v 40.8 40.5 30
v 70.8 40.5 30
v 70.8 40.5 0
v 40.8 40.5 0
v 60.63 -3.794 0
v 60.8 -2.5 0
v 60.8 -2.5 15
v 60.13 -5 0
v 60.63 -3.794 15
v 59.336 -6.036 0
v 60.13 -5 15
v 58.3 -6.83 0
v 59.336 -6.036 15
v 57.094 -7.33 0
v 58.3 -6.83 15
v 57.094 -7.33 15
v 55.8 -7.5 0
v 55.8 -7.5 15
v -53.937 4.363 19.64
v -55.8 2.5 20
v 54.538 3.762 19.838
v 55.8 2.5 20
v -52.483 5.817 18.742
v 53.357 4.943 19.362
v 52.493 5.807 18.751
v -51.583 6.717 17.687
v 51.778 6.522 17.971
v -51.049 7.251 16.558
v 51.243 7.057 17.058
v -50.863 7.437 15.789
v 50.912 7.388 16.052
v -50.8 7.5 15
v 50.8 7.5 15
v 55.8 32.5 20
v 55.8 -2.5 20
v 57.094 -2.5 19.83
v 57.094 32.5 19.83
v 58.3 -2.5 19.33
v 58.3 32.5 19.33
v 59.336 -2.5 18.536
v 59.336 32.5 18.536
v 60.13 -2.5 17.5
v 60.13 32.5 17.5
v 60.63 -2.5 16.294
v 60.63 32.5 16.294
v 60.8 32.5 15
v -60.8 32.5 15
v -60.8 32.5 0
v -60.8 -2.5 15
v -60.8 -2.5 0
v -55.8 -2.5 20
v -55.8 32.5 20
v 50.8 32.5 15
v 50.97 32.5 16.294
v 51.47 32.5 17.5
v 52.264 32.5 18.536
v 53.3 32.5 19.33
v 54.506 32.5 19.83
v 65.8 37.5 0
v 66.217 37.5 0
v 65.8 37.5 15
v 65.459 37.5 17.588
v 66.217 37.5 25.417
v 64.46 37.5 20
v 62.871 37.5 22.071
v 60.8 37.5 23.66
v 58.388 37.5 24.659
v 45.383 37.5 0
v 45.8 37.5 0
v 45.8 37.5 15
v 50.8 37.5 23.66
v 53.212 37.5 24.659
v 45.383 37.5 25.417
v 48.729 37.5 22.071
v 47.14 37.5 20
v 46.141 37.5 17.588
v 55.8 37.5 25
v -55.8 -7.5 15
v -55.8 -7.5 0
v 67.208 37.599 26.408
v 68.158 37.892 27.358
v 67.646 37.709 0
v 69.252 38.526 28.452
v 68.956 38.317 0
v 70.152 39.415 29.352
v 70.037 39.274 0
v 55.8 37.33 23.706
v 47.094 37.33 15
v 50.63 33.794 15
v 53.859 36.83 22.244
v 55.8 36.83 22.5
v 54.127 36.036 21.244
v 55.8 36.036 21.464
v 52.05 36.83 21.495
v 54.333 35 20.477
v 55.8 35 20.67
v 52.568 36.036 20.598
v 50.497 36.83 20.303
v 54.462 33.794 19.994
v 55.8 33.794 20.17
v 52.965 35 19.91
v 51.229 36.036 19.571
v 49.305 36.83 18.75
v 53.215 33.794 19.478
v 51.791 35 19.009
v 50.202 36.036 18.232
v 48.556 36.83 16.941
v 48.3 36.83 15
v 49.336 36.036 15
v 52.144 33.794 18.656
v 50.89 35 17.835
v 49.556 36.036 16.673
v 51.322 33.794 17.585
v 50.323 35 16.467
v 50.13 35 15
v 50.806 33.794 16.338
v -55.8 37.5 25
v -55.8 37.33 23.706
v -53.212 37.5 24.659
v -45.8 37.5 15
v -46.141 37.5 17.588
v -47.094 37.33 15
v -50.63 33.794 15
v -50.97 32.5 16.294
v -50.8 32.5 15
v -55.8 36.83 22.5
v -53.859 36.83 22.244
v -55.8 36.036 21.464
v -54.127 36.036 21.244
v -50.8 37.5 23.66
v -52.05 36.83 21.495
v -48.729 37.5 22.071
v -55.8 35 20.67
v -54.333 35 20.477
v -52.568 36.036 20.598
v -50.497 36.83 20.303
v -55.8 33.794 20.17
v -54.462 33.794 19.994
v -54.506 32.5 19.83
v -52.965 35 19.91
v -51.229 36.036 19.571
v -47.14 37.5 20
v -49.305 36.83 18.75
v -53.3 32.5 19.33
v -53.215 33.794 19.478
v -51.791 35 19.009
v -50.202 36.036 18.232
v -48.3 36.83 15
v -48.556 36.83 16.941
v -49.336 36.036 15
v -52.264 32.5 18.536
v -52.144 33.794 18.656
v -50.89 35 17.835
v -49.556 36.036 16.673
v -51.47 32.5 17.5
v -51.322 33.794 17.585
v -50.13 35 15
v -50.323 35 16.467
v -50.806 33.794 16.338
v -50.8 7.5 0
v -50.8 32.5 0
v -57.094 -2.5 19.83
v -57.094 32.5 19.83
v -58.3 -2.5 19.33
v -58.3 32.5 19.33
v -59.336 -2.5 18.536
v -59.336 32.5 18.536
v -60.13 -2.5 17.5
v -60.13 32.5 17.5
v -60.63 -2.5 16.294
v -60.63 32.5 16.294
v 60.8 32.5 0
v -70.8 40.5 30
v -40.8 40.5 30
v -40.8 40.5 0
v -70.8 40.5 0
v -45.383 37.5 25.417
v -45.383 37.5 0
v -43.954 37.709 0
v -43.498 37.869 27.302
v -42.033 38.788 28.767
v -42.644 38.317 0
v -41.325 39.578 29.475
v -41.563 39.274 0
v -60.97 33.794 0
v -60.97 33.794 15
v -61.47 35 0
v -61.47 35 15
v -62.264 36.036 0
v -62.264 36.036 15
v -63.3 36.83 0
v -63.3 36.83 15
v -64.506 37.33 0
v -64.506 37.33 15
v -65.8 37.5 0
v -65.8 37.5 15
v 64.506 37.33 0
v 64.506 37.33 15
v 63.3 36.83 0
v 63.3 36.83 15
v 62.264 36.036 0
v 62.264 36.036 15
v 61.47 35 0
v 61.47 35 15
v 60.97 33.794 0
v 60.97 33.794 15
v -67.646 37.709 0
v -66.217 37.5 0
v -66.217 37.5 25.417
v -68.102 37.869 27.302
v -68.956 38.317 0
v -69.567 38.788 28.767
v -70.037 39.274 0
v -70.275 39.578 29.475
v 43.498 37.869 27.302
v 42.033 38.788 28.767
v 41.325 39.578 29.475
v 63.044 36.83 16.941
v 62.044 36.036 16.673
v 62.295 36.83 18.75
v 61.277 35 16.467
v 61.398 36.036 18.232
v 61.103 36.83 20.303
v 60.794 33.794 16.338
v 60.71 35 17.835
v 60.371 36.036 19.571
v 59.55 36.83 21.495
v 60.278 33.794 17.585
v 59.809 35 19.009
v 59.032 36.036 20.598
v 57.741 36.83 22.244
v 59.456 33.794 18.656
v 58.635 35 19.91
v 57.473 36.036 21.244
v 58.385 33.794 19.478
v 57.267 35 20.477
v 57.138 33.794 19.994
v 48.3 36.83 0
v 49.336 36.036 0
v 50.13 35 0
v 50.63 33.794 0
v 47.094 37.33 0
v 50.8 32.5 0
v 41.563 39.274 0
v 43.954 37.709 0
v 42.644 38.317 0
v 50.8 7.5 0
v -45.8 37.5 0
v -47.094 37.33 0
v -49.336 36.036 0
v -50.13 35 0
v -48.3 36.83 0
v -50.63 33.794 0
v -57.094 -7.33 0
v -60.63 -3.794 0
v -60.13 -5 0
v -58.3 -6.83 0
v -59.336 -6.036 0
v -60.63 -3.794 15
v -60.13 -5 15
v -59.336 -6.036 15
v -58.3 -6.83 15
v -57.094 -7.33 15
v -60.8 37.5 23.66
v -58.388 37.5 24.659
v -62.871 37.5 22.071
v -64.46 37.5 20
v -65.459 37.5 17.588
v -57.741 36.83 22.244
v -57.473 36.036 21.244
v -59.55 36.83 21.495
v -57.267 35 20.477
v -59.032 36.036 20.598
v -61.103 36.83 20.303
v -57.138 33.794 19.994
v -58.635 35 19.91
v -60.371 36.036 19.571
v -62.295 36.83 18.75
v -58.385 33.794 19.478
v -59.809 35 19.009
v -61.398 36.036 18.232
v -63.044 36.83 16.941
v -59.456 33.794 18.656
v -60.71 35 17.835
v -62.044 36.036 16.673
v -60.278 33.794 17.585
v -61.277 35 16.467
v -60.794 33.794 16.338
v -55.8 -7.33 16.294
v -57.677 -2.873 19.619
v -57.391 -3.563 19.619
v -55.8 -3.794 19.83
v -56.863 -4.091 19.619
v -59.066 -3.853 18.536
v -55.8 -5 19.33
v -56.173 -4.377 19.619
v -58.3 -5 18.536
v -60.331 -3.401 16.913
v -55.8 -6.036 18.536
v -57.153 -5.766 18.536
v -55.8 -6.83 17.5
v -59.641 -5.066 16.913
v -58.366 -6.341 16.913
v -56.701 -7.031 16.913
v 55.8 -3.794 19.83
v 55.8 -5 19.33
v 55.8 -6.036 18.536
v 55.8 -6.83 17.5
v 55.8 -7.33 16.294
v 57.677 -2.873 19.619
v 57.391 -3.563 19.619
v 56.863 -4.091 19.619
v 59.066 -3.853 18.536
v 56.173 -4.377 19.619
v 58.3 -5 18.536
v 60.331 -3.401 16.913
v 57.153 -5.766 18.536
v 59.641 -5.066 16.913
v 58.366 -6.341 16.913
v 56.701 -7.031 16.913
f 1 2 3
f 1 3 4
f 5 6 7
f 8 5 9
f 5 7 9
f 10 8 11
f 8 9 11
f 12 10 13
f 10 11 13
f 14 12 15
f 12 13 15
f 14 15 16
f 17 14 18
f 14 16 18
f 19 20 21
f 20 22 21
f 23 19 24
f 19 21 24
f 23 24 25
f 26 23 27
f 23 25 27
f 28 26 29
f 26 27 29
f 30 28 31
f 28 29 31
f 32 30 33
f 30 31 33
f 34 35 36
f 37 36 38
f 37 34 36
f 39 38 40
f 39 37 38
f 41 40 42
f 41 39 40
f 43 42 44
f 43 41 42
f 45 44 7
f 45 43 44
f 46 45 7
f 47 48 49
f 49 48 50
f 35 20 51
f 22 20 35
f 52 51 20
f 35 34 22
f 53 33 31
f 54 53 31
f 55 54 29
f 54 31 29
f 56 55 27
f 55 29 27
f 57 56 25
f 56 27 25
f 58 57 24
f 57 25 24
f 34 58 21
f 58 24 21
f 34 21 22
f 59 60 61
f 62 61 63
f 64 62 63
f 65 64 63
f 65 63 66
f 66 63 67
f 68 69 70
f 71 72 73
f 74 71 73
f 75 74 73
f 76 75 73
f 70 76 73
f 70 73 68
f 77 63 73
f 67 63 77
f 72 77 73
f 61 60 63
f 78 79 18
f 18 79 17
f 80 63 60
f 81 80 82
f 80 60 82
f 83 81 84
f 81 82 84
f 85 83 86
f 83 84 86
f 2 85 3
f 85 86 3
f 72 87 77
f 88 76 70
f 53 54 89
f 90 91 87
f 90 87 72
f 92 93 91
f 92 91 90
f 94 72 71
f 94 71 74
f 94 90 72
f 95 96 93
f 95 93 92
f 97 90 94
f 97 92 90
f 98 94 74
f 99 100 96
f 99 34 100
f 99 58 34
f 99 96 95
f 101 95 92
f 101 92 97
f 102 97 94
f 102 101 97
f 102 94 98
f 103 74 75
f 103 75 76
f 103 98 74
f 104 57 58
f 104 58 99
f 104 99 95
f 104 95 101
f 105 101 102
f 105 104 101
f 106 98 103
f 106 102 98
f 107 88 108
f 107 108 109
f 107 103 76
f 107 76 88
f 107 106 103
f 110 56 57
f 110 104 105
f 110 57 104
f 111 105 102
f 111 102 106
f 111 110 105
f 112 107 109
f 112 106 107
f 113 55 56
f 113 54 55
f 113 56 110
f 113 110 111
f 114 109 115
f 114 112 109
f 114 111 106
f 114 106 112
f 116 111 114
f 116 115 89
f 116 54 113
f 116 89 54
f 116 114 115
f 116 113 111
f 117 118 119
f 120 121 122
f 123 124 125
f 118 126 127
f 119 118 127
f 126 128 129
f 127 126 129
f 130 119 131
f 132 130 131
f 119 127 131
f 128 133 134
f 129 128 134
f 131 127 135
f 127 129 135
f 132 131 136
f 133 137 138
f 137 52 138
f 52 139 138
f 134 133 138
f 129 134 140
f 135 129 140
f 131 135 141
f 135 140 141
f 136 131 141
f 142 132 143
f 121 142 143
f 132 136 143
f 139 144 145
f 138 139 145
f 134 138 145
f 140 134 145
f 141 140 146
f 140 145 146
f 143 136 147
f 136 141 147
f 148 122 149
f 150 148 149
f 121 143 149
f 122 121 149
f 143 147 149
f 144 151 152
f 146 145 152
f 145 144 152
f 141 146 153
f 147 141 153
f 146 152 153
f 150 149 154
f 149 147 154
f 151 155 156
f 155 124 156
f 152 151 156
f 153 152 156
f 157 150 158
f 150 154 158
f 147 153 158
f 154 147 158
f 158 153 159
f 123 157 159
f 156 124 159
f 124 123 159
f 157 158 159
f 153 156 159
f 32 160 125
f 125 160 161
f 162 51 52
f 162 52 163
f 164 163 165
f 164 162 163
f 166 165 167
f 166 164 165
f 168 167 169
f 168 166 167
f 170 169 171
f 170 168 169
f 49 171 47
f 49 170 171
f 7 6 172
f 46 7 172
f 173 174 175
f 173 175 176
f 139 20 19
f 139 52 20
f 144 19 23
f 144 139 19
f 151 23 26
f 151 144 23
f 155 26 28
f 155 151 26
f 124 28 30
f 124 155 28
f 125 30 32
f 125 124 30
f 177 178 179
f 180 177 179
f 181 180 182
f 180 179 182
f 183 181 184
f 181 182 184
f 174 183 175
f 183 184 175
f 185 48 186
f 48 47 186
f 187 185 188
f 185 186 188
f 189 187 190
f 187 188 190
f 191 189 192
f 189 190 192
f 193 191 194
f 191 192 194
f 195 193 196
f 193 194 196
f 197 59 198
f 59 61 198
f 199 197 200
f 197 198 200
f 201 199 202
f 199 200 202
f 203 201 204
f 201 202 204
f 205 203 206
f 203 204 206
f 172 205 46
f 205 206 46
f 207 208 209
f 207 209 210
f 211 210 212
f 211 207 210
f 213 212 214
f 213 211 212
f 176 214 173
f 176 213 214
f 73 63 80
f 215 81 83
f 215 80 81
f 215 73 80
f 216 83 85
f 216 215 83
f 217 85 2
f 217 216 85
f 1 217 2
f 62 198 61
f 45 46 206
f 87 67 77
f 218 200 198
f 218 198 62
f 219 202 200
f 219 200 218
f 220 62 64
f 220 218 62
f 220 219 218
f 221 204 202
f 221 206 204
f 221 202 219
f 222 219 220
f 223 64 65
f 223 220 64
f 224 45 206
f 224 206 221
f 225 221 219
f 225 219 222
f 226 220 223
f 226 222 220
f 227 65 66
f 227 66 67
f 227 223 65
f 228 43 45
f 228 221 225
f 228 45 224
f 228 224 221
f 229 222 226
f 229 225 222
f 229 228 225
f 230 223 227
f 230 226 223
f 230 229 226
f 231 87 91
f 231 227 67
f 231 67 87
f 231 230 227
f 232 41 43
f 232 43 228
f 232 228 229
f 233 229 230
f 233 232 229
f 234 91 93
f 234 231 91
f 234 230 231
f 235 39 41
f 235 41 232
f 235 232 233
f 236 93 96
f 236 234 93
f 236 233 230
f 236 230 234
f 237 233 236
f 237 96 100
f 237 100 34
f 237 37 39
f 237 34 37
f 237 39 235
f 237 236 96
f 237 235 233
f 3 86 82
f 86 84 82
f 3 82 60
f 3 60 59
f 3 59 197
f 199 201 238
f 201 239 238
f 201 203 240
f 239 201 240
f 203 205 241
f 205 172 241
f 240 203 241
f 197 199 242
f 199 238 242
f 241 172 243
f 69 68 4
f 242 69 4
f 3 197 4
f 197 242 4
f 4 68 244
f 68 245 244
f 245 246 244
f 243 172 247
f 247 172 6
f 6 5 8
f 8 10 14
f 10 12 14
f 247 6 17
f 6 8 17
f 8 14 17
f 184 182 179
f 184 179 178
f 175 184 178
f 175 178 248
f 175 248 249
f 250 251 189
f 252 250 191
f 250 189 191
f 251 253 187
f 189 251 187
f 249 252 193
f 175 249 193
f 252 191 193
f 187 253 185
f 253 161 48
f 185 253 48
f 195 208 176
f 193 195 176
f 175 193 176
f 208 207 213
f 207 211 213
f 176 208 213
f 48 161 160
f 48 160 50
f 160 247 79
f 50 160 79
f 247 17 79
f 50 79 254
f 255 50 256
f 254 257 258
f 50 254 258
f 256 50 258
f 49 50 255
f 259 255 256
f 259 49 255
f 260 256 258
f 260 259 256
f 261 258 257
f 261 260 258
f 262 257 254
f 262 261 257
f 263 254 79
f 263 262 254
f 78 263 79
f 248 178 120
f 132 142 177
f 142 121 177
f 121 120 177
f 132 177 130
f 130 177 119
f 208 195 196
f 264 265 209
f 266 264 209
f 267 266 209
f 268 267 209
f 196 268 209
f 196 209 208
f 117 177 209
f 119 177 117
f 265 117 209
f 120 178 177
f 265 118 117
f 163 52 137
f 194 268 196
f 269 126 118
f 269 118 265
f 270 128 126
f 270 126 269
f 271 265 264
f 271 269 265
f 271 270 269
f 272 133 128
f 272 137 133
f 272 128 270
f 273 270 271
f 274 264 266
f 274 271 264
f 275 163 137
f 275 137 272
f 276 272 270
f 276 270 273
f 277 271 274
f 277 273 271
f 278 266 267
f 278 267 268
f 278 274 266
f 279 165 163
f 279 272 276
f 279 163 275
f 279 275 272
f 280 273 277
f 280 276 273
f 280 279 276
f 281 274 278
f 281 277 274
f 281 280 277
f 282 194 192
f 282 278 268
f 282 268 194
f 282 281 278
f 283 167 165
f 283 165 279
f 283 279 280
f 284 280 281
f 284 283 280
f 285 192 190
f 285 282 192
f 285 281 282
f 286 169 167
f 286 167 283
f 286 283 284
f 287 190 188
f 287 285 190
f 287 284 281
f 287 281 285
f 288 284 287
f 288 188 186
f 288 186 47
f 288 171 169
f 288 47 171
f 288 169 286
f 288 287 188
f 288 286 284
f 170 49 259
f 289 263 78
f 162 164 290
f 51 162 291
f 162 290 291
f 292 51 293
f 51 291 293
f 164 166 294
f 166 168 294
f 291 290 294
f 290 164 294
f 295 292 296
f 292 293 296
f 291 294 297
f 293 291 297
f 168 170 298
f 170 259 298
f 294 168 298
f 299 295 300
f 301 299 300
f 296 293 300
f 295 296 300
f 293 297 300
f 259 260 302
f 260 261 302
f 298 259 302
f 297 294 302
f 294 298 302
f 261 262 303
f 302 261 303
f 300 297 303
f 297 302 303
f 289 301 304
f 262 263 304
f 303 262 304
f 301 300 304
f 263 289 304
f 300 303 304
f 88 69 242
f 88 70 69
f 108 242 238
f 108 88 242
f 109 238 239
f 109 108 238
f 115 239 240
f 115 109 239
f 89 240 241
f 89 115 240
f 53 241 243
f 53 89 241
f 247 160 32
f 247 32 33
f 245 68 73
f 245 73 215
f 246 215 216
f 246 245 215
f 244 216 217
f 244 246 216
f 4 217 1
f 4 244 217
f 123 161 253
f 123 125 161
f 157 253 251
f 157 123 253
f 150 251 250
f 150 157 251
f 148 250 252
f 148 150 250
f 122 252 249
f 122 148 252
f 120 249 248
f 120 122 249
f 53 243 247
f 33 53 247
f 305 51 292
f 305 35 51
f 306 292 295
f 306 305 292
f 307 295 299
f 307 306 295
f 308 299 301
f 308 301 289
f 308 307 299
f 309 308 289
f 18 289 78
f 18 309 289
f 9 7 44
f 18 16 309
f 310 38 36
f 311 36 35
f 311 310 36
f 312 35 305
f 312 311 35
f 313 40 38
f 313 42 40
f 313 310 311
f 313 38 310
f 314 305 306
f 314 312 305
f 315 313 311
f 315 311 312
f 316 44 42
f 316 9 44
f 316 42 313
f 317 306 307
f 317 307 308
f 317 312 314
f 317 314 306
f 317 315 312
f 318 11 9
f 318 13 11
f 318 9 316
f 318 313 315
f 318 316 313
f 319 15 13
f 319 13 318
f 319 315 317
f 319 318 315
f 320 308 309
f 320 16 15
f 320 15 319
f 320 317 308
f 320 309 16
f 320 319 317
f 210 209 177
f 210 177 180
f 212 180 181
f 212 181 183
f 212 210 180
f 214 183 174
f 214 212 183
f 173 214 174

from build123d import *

# Parameters (mm, degrees)
F0_W        = 101.6
F0_H        = 15
F1_DEPTH    = 20
F2_W        = 30
F2_H        = 30
F3_DEPTH    = 3
F4_R        = 4.99999
F5_T1_DEPTH = 52.9128784748
F5_T3_DEPTH = 52.9128784748
F5_T5_DEPTH = 52.9128784748


# Not quite as in the source:
# - a fillet or chamfer that OpenCascade refuses, or shapes differently, is made with other operations: its cross-section is extruded or revolved along the edge and cut away or added
# - a fillet or chamfer is up to 0.001 mm smaller than in the source, because OpenCascade refuses the exact size
# - a feature of the source that left no trace in its solid (it failed there, or was rolled back) is left out


with BuildPart() as f1:
    # F0 (on Top) → F1 (new body)
    with BuildSketch(Plane.XY):
        Rectangle(F0_W, F0_H)
        Polygon((50.8, 7.5), (50.8, -7.5), (60.8, -7.5), (60.8, 37.5), (50.8, 37.5), align=None)
        Polygon((-60.8, -7.5), (-50.8, -7.5), (-50.8, 7.5), (-50.8, 37.5), (-60.8, 37.5), align=None)
    extrude(amount=F1_DEPTH)

    # F2 (on face) → F3 (join)
    with BuildSketch(Plane(origin=(0, 37.5, 0), x_dir=(-1, 0, 0), z_dir=(0, 1, 0))):
        with Locations((-55.8, 15)):
            Rectangle(F2_W, F2_H)
        with Locations((55.8, 15)):
            Rectangle(F2_W, F2_H)
    extrude(amount=F3_DEPTH)

    # F4 (radius 5 in the source; OpenCascade refuses exactly that, so slightly less here)
    f4_edges = [f1.edges().sort_by_distance(p)[0] for p in [
        (-55.8, 37.5, 20),
        (-50.8, 37.5, 10),
        (-60.8, 37.5, 10),
        (-60.8, -7.5, 10),
        (60.8, -7.5, 10),
        (60.8, 37.5, 10),
        (55.8, 37.5, 20),
        (50.8, 37.5, 10),
        (60.8, 15, 20),
        (50.8, 22.5, 20),
        (0, 7.5, 20),
        (-50.8, 22.5, 20),
        (-60.8, 15, 20),
        (0, -7.5, 20),
    ]]
    fillet(f4_edges, radius=F4_R)

    # F5: fillet of radius 5 on 6 edges, made by hand

    # F5_s2 → F5_t1 (cut)
    with BuildSketch(Plane.YZ.offset(-82.2564392374)):
        with BuildLine():
            ThreePointArc((37.5, 25.417424305), (38.3166998673, 28.1560370926), (40.5, 30))
            Line((40.5, 30), (37.5, 30))
            Line((37.5, 30), (37.5, 25.417424305))
        make_face()
    extrude(amount=F5_T1_DEPTH, mode=Mode.SUBTRACT)

    # F5_s4 → F5_t3 (cut)
    with BuildSketch(Plane.XY.offset(-11.4564392374)):
        with BuildLine():
            ThreePointArc((-66.217424305, 37.5), (-68.9560370926, 38.3166998673), (-70.8, 40.5))
            Line((-70.8, 40.5), (-70.8, 37.5))
            Line((-70.8, 37.5), (-66.217424305, 37.5))
        make_face()
        with BuildLine():
            ThreePointArc((-45.382575695, 37.5), (-42.6439629074, 38.3166998673), (-40.8, 40.5))
            Line((-40.8, 40.5), (-40.8, 37.5))
            Line((-40.8, 37.5), (-45.382575695, 37.5))
        make_face()
        with BuildLine():
            ThreePointArc((45.382575695, 37.5), (42.6439629074, 38.3166998673), (40.8, 40.5))
            Line((40.8, 40.5), (40.8, 37.5))
            Line((40.8, 37.5), (45.382575695, 37.5))
        make_face()
        with BuildLine():
            ThreePointArc((66.217424305, 37.5), (68.9560370926, 38.3166998673), (70.8, 40.5))
            Line((70.8, 40.5), (70.8, 37.5))
            Line((70.8, 37.5), (66.217424305, 37.5))
        make_face()
    extrude(amount=F5_T3_DEPTH, mode=Mode.SUBTRACT)

    # F5_s6 → F5_t5 (cut)
    with BuildSketch(Plane.YZ.offset(29.3435607626)):
        with BuildLine():
            ThreePointArc((37.5, 25.417424305), (38.3166998673, 28.1560370926), (40.5, 30))
            Line((40.5, 30), (37.5, 30))
            Line((37.5, 30), (37.5, 25.417424305))
        make_face()
    extrude(amount=F5_T5_DEPTH, mode=Mode.SUBTRACT)


solid = f1.part
